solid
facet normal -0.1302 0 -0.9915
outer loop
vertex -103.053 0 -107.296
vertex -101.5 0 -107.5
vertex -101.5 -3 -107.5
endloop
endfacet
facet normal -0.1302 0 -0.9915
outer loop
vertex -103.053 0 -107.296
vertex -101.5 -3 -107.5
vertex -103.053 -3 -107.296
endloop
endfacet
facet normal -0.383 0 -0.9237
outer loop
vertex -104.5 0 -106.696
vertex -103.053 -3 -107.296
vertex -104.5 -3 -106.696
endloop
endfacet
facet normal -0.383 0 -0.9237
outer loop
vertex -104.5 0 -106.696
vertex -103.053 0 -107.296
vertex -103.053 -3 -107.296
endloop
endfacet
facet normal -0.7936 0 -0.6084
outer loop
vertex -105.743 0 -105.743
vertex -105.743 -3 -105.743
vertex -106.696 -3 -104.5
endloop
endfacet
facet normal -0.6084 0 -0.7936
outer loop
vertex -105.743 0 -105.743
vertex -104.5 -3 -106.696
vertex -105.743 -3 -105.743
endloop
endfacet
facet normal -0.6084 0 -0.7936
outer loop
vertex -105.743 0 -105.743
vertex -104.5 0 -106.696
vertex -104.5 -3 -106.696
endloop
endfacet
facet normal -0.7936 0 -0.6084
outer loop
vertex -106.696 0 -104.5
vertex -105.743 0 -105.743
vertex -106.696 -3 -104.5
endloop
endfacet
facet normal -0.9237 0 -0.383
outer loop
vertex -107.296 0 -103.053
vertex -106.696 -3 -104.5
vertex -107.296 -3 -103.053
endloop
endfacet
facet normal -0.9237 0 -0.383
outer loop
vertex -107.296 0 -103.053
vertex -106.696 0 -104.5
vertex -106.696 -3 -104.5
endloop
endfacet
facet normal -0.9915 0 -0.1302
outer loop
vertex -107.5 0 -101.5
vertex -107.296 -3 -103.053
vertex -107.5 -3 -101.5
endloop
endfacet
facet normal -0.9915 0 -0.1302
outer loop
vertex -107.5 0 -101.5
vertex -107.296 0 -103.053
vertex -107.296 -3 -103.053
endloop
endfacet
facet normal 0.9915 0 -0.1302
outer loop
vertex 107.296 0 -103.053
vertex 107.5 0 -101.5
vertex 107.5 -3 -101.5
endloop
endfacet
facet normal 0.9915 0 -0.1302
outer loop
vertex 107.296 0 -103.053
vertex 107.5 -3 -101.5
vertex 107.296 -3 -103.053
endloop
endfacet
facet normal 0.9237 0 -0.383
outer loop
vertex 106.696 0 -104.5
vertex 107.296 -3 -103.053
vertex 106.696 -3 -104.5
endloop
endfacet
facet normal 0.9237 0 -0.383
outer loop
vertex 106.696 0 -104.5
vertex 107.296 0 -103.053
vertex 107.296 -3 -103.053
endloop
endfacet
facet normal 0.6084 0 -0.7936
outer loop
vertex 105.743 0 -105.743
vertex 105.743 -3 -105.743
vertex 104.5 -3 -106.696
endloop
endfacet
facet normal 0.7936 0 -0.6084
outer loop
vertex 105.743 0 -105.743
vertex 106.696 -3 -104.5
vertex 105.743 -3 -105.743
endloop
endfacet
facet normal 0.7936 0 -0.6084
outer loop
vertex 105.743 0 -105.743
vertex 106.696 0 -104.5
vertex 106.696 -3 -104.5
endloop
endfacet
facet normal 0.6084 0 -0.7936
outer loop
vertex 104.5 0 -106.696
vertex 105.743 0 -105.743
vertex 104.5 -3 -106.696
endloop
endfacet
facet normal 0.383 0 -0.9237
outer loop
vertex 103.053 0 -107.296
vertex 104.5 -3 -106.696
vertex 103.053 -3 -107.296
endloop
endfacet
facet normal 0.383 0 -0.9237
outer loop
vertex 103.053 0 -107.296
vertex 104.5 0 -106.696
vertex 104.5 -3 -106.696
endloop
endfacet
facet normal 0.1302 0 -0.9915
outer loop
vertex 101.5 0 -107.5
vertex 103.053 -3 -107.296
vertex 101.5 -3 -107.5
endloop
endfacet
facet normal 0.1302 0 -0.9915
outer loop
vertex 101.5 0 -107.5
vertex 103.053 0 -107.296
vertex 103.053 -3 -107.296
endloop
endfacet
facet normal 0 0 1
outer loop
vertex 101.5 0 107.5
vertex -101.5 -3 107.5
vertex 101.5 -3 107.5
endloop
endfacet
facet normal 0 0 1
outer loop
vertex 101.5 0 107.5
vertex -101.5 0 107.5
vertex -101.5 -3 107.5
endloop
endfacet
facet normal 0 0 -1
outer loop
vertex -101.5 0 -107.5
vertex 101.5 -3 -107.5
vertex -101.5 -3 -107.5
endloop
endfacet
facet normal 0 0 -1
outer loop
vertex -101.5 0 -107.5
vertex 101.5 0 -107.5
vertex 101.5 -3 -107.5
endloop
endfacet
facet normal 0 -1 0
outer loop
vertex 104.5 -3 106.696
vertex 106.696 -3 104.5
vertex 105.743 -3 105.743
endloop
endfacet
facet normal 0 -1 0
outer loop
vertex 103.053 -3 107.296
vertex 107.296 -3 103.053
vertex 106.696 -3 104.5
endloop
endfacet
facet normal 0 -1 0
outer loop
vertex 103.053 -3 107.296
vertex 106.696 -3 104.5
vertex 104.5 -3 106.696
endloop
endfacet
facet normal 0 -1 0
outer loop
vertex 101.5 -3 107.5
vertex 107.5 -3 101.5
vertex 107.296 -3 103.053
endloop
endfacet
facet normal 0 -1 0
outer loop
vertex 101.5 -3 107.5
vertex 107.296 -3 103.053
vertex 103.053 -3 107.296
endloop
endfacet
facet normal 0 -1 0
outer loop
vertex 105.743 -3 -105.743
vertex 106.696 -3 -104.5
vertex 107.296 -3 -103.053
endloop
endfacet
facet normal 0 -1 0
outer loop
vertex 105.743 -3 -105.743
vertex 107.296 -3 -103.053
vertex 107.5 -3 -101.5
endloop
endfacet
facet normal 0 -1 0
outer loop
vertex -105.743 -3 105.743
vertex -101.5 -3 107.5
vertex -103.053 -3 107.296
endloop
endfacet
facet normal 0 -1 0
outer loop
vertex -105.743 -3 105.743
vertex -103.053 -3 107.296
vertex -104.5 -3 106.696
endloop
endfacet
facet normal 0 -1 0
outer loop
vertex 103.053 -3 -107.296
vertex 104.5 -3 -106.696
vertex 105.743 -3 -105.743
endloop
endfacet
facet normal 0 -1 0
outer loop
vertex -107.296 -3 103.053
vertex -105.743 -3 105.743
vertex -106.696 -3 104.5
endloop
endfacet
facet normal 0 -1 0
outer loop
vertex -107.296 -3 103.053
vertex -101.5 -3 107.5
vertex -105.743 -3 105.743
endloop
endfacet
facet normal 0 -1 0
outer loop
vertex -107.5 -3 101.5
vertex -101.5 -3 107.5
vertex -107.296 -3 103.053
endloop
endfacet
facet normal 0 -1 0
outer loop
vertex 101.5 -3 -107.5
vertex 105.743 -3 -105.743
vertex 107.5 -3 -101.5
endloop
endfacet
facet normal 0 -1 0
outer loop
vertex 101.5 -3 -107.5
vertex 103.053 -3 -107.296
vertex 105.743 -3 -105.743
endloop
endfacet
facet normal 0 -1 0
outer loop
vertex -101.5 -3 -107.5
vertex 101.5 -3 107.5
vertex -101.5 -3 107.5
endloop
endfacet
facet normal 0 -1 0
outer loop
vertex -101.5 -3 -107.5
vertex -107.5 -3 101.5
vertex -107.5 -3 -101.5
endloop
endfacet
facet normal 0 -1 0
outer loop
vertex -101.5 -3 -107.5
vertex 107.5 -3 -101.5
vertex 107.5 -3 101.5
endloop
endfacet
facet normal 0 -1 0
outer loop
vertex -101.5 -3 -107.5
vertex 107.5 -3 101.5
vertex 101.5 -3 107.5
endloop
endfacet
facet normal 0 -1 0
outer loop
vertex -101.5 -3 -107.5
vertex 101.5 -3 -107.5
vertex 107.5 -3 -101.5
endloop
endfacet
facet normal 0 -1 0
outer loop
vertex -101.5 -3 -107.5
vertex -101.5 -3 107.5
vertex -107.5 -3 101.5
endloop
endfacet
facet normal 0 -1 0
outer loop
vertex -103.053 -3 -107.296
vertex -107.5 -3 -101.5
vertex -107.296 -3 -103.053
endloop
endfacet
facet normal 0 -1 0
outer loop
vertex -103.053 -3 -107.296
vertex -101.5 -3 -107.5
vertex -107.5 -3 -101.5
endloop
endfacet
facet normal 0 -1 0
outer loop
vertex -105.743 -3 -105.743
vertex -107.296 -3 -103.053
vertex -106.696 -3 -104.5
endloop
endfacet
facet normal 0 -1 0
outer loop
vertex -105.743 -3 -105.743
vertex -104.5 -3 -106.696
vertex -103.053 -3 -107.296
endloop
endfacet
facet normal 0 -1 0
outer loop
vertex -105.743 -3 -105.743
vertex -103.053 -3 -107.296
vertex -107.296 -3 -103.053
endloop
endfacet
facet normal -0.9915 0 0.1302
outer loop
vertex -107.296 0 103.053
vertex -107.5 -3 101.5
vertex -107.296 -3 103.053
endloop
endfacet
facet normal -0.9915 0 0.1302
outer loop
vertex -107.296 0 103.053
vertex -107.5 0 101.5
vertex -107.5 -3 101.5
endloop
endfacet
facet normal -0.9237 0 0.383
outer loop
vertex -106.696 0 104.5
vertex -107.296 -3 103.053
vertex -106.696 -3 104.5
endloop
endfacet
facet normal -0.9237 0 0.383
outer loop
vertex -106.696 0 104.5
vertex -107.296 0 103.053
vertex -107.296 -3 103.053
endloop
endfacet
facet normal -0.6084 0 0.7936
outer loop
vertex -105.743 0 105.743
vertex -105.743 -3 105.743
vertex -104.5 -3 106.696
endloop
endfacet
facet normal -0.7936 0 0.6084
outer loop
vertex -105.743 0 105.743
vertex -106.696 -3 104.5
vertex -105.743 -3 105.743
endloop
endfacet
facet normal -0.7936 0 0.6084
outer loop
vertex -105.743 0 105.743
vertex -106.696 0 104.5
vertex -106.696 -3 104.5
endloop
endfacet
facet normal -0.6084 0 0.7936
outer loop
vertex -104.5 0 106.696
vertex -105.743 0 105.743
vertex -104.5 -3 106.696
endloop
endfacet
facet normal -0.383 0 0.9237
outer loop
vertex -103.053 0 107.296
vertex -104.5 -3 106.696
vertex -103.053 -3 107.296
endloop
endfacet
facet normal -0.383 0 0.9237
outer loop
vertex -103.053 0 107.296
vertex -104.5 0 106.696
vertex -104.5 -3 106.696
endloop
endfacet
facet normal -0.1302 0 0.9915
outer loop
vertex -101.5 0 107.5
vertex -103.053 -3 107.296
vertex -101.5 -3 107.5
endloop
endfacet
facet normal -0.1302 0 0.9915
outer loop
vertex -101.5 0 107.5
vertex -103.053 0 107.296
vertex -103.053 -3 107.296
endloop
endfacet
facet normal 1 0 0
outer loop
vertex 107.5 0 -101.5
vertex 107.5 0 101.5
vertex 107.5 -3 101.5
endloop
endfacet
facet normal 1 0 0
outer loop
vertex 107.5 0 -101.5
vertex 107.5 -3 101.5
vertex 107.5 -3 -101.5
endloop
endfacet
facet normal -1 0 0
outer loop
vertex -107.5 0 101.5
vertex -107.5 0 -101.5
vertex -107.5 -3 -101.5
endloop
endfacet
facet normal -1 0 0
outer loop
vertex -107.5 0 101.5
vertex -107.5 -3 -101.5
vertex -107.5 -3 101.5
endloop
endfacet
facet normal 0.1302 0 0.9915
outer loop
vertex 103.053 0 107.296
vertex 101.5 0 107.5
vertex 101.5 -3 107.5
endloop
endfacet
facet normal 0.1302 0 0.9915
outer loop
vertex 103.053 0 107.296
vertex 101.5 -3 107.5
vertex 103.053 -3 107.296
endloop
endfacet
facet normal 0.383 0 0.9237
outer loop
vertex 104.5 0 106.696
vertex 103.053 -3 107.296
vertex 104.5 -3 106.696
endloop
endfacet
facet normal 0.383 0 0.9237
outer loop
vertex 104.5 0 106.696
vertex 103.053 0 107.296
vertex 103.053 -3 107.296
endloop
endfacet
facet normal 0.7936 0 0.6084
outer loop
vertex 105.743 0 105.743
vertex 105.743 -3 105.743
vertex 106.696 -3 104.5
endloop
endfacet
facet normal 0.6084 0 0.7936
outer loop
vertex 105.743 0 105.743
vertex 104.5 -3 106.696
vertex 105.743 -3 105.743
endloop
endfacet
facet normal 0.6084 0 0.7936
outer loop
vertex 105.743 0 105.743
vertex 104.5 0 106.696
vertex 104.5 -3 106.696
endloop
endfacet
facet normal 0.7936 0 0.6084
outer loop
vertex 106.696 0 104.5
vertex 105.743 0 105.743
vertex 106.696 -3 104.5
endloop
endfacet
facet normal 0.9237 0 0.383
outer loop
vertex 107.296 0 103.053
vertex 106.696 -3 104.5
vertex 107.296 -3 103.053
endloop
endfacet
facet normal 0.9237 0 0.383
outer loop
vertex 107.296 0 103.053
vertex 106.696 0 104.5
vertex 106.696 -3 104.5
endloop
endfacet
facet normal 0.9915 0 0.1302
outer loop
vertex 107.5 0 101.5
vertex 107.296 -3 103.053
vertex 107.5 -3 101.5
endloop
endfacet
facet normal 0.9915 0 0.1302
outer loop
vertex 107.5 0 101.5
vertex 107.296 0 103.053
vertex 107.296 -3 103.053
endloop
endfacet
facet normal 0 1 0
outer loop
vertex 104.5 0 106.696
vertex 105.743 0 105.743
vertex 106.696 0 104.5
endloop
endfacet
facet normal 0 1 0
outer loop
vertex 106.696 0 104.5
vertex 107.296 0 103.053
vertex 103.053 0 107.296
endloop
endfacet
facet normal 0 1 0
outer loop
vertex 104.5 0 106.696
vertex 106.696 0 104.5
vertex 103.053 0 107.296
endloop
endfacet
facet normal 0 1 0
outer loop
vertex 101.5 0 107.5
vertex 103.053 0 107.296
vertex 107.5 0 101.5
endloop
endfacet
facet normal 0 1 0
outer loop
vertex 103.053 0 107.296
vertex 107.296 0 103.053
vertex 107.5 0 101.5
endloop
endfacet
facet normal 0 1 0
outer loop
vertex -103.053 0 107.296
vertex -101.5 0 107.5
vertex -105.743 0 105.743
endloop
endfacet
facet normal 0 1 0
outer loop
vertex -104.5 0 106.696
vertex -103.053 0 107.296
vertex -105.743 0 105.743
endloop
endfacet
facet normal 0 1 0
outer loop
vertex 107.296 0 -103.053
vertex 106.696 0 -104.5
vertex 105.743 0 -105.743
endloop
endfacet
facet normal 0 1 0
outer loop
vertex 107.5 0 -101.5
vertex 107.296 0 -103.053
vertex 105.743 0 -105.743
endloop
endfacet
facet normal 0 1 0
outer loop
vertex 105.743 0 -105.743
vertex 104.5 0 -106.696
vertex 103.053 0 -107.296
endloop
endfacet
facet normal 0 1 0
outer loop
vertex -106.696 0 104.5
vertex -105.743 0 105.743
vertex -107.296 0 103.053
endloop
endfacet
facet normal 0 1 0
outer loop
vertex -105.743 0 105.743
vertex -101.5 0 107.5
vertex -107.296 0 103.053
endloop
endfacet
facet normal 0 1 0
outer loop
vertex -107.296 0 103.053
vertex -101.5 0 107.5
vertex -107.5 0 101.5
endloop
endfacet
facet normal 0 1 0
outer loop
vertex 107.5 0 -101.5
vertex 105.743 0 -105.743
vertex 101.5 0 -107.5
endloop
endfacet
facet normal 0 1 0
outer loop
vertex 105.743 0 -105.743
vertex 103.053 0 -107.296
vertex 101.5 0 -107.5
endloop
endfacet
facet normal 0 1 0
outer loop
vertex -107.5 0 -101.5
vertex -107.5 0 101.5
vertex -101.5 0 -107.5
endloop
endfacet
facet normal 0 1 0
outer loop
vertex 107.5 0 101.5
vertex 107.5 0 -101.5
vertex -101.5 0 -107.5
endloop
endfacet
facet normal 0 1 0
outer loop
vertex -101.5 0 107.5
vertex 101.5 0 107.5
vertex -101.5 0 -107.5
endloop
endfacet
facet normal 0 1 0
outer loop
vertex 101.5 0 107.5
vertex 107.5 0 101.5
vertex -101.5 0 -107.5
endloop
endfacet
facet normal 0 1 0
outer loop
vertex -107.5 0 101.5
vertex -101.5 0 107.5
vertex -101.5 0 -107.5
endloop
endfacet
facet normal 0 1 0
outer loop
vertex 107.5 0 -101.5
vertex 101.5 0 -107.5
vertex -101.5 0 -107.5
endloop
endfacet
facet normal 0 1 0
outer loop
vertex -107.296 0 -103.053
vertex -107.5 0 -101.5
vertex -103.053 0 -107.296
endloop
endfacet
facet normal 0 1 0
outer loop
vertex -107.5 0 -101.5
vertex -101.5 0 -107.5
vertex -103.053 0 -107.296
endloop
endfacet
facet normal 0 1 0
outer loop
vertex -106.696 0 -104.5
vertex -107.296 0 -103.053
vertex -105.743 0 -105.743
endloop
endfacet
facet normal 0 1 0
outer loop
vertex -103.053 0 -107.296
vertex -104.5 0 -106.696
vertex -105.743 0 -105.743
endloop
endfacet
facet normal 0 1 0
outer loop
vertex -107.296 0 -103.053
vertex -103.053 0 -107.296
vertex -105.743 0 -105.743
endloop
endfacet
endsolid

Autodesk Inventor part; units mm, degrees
ref_plane "YZ Plane" through (0, 0, 0) normal (1, 0, 0) x (0, 1, 0)
ref_plane "XZ Plane" through (0, 0, 0) normal (0, 1, 0) x (-1, 0, 0)
ref_plane "XY Plane" through (0, 0, 0) normal (0, 0, 1) x (1, 0, 0)
ref_plane "Work Plane1" through (-0.0001, 0, 0) normal (0, -1, 0) x (-1, 0, 0)
sketch "Sketch1" plane through (-0.0001, 0, 0) normal (0, -1, 0) x (-1, 0, 0)
  circle A0 centre (-100.5001, -100.5001) radius 1.6 construction
  circle A1 centre (-100.5001, 100.5001) radius 1.6 construction
  circle A2 centre (100.5001, 100.5001) radius 1.6 construction
  circle A3 centre (100.5001, -100.5001) radius 1.6 construction
  line L0 (-97.4996, 3.9999) -> (-97.4996, 82.5416) construction
  line L1 (-97.4996, 82.5416) -> (-72.0063, 57.0482) construction
  line L2 (-72.0063, 57.0482) -> (-72.0063, 3.9999) construction
  line L3 (-72.0063, 3.9999) -> (-97.4996, 3.9999) construction
  line L4 (-97.4996, -82.5021) -> (-97.4996, -4.0001) construction
  line L5 (-97.4996, -4.0001) -> (-72.0063, -4.0001) construction
  line L6 (-72.0063, -4.0001) -> (-72.0063, -57.0088) construction
  line L7 (-72.0063, -57.0088) -> (-97.4996, -82.5021) construction
  line L8 (97.4891, -4.0001) -> (97.4891, -82.4901) construction
  line L9 (97.4891, -82.4901) -> (72.0063, -57.007) construction
  line L10 (72.0063, -57.007) -> (72.0063, -4.0001) construction
  line L11 (72.0063, -4.0001) -> (97.4891, -4.0001) construction
  line L12 (97.4891, 82.4918) -> (97.4891, 4.0106) construction
  line L13 (97.4891, 4.0106) -> (72.0063, 3.9999) construction
  line L14 (72.0063, 3.9999) -> (72.0063, 57.0089) construction
  line L15 (72.0063, 57.0089) -> (97.4891, 82.4918) construction
  line L16 (3.998, 18.9804) -> (3.998, 93.318) construction
  line L17 (3.998, 93.318) -> (41.1668, 56.1492) construction
  line L18 (41.1668, 56.1492) -> (3.998, 18.9804) construction
  line L19 (41.1668, -56.0334) -> (3.998, -93.2022) construction
  line L20 (3.998, -93.2022) -> (3.998, -18.8647) construction
  line L21 (3.998, -18.8647) -> (41.1668, -56.0334) construction
  line L22 (-4.0018, -18.9081) -> (-4.0018, -93.1785) construction
  line L23 (-4.0018, -93.1785) -> (-41.1372, -56.0431) construction
  line L24 (-41.1372, -56.0431) -> (-4.0018, -18.9081) construction
  line L25 (-4.0018, 93.294) -> (-4.0018, 19.0236) construction
  line L26 (-4.0018, 19.0236) -> (-41.1372, 56.1588) construction
  line L27 (-41.1372, 56.1588) -> (-4.0018, 93.294) construction
  line L28 (45.4095, 60.3918) -> (8.292, 97.5093) construction
  line L29 (8.292, 97.5093) -> (82.5267, 97.5093) construction
  line L30 (82.5267, 97.5093) -> (45.4095, 60.3918) construction
  line L31 (8.292, -97.3935) -> (45.4095, -60.2762) construction
  line L32 (45.4095, -60.2762) -> (82.5267, -97.3935) construction
  line L33 (82.5267, -97.3935) -> (8.292, -97.3935) construction
  line L34 (-8.272, -97.3935) -> (-82.4876, -97.3935) construction
  line L35 (-82.4876, -97.3935) -> (-45.3798, -60.2857) construction
  line L36 (-45.3798, -60.2857) -> (-8.272, -97.3935) construction
  line L37 (-8.272, 97.5093) -> (-45.3798, 60.4015) construction
  line L38 (-45.3798, 60.4015) -> (-82.4876, 97.5093) construction
  line L39 (-82.4876, 97.5093) -> (-8.272, 97.5093) construction
  line L40 (-50.0062, -35.0087) -> (-50.0062, 35.0482) construction
  line L41 (-50.0062, 35.0482) -> (-19.4004, 4.4423) construction
  line L42 (-19.4004, 4.4423) -> (-19.4004, -4.4028) construction
  line L43 (-19.4004, -4.4028) -> (-50.0062, -35.0087) construction
  line L44 (19.4508, -4.4518) -> (19.4508, 4.4535) construction
  line L45 (19.4508, 4.4535) -> (50.0062, 35.0089) construction
  line L46 (50.0062, 35.0089) -> (50.0062, -35.007) construction
  line L47 (50.0062, -35.007) -> (19.4508, -4.4518) construction
  line L48 (101.5001, -107.5001) -> (-101.5001, -107.5001) projected
  arc A4 (101.5001, -107.5001) -> (107.5001, -101.5001) centre (101.5001, -101.5001) ccw projected
  line L49 (107.5001, 101.5001) -> (107.5001, -101.5001) projected
  arc A5 (107.5001, 101.5001) -> (101.5001, 107.5001) centre (101.5001, 101.5001) ccw projected
  line L50 (-101.5001, 107.5001) -> (101.5001, 107.5001) projected
  arc A6 (-101.5001, 107.5001) -> (-107.5001, 101.5001) centre (-101.5001, 101.5001) ccw projected
  line L51 (-107.5001, -101.5001) -> (-107.5001, 101.5001) projected
  arc A7 (-107.5001, -101.5001) -> (-101.5001, -107.5001) centre (-101.5001, -101.5001) ccw projected
extrude "Extrusion1" add sketch "Sketch1" along normal blind 3
properties part number "piastra_superiorissima"
